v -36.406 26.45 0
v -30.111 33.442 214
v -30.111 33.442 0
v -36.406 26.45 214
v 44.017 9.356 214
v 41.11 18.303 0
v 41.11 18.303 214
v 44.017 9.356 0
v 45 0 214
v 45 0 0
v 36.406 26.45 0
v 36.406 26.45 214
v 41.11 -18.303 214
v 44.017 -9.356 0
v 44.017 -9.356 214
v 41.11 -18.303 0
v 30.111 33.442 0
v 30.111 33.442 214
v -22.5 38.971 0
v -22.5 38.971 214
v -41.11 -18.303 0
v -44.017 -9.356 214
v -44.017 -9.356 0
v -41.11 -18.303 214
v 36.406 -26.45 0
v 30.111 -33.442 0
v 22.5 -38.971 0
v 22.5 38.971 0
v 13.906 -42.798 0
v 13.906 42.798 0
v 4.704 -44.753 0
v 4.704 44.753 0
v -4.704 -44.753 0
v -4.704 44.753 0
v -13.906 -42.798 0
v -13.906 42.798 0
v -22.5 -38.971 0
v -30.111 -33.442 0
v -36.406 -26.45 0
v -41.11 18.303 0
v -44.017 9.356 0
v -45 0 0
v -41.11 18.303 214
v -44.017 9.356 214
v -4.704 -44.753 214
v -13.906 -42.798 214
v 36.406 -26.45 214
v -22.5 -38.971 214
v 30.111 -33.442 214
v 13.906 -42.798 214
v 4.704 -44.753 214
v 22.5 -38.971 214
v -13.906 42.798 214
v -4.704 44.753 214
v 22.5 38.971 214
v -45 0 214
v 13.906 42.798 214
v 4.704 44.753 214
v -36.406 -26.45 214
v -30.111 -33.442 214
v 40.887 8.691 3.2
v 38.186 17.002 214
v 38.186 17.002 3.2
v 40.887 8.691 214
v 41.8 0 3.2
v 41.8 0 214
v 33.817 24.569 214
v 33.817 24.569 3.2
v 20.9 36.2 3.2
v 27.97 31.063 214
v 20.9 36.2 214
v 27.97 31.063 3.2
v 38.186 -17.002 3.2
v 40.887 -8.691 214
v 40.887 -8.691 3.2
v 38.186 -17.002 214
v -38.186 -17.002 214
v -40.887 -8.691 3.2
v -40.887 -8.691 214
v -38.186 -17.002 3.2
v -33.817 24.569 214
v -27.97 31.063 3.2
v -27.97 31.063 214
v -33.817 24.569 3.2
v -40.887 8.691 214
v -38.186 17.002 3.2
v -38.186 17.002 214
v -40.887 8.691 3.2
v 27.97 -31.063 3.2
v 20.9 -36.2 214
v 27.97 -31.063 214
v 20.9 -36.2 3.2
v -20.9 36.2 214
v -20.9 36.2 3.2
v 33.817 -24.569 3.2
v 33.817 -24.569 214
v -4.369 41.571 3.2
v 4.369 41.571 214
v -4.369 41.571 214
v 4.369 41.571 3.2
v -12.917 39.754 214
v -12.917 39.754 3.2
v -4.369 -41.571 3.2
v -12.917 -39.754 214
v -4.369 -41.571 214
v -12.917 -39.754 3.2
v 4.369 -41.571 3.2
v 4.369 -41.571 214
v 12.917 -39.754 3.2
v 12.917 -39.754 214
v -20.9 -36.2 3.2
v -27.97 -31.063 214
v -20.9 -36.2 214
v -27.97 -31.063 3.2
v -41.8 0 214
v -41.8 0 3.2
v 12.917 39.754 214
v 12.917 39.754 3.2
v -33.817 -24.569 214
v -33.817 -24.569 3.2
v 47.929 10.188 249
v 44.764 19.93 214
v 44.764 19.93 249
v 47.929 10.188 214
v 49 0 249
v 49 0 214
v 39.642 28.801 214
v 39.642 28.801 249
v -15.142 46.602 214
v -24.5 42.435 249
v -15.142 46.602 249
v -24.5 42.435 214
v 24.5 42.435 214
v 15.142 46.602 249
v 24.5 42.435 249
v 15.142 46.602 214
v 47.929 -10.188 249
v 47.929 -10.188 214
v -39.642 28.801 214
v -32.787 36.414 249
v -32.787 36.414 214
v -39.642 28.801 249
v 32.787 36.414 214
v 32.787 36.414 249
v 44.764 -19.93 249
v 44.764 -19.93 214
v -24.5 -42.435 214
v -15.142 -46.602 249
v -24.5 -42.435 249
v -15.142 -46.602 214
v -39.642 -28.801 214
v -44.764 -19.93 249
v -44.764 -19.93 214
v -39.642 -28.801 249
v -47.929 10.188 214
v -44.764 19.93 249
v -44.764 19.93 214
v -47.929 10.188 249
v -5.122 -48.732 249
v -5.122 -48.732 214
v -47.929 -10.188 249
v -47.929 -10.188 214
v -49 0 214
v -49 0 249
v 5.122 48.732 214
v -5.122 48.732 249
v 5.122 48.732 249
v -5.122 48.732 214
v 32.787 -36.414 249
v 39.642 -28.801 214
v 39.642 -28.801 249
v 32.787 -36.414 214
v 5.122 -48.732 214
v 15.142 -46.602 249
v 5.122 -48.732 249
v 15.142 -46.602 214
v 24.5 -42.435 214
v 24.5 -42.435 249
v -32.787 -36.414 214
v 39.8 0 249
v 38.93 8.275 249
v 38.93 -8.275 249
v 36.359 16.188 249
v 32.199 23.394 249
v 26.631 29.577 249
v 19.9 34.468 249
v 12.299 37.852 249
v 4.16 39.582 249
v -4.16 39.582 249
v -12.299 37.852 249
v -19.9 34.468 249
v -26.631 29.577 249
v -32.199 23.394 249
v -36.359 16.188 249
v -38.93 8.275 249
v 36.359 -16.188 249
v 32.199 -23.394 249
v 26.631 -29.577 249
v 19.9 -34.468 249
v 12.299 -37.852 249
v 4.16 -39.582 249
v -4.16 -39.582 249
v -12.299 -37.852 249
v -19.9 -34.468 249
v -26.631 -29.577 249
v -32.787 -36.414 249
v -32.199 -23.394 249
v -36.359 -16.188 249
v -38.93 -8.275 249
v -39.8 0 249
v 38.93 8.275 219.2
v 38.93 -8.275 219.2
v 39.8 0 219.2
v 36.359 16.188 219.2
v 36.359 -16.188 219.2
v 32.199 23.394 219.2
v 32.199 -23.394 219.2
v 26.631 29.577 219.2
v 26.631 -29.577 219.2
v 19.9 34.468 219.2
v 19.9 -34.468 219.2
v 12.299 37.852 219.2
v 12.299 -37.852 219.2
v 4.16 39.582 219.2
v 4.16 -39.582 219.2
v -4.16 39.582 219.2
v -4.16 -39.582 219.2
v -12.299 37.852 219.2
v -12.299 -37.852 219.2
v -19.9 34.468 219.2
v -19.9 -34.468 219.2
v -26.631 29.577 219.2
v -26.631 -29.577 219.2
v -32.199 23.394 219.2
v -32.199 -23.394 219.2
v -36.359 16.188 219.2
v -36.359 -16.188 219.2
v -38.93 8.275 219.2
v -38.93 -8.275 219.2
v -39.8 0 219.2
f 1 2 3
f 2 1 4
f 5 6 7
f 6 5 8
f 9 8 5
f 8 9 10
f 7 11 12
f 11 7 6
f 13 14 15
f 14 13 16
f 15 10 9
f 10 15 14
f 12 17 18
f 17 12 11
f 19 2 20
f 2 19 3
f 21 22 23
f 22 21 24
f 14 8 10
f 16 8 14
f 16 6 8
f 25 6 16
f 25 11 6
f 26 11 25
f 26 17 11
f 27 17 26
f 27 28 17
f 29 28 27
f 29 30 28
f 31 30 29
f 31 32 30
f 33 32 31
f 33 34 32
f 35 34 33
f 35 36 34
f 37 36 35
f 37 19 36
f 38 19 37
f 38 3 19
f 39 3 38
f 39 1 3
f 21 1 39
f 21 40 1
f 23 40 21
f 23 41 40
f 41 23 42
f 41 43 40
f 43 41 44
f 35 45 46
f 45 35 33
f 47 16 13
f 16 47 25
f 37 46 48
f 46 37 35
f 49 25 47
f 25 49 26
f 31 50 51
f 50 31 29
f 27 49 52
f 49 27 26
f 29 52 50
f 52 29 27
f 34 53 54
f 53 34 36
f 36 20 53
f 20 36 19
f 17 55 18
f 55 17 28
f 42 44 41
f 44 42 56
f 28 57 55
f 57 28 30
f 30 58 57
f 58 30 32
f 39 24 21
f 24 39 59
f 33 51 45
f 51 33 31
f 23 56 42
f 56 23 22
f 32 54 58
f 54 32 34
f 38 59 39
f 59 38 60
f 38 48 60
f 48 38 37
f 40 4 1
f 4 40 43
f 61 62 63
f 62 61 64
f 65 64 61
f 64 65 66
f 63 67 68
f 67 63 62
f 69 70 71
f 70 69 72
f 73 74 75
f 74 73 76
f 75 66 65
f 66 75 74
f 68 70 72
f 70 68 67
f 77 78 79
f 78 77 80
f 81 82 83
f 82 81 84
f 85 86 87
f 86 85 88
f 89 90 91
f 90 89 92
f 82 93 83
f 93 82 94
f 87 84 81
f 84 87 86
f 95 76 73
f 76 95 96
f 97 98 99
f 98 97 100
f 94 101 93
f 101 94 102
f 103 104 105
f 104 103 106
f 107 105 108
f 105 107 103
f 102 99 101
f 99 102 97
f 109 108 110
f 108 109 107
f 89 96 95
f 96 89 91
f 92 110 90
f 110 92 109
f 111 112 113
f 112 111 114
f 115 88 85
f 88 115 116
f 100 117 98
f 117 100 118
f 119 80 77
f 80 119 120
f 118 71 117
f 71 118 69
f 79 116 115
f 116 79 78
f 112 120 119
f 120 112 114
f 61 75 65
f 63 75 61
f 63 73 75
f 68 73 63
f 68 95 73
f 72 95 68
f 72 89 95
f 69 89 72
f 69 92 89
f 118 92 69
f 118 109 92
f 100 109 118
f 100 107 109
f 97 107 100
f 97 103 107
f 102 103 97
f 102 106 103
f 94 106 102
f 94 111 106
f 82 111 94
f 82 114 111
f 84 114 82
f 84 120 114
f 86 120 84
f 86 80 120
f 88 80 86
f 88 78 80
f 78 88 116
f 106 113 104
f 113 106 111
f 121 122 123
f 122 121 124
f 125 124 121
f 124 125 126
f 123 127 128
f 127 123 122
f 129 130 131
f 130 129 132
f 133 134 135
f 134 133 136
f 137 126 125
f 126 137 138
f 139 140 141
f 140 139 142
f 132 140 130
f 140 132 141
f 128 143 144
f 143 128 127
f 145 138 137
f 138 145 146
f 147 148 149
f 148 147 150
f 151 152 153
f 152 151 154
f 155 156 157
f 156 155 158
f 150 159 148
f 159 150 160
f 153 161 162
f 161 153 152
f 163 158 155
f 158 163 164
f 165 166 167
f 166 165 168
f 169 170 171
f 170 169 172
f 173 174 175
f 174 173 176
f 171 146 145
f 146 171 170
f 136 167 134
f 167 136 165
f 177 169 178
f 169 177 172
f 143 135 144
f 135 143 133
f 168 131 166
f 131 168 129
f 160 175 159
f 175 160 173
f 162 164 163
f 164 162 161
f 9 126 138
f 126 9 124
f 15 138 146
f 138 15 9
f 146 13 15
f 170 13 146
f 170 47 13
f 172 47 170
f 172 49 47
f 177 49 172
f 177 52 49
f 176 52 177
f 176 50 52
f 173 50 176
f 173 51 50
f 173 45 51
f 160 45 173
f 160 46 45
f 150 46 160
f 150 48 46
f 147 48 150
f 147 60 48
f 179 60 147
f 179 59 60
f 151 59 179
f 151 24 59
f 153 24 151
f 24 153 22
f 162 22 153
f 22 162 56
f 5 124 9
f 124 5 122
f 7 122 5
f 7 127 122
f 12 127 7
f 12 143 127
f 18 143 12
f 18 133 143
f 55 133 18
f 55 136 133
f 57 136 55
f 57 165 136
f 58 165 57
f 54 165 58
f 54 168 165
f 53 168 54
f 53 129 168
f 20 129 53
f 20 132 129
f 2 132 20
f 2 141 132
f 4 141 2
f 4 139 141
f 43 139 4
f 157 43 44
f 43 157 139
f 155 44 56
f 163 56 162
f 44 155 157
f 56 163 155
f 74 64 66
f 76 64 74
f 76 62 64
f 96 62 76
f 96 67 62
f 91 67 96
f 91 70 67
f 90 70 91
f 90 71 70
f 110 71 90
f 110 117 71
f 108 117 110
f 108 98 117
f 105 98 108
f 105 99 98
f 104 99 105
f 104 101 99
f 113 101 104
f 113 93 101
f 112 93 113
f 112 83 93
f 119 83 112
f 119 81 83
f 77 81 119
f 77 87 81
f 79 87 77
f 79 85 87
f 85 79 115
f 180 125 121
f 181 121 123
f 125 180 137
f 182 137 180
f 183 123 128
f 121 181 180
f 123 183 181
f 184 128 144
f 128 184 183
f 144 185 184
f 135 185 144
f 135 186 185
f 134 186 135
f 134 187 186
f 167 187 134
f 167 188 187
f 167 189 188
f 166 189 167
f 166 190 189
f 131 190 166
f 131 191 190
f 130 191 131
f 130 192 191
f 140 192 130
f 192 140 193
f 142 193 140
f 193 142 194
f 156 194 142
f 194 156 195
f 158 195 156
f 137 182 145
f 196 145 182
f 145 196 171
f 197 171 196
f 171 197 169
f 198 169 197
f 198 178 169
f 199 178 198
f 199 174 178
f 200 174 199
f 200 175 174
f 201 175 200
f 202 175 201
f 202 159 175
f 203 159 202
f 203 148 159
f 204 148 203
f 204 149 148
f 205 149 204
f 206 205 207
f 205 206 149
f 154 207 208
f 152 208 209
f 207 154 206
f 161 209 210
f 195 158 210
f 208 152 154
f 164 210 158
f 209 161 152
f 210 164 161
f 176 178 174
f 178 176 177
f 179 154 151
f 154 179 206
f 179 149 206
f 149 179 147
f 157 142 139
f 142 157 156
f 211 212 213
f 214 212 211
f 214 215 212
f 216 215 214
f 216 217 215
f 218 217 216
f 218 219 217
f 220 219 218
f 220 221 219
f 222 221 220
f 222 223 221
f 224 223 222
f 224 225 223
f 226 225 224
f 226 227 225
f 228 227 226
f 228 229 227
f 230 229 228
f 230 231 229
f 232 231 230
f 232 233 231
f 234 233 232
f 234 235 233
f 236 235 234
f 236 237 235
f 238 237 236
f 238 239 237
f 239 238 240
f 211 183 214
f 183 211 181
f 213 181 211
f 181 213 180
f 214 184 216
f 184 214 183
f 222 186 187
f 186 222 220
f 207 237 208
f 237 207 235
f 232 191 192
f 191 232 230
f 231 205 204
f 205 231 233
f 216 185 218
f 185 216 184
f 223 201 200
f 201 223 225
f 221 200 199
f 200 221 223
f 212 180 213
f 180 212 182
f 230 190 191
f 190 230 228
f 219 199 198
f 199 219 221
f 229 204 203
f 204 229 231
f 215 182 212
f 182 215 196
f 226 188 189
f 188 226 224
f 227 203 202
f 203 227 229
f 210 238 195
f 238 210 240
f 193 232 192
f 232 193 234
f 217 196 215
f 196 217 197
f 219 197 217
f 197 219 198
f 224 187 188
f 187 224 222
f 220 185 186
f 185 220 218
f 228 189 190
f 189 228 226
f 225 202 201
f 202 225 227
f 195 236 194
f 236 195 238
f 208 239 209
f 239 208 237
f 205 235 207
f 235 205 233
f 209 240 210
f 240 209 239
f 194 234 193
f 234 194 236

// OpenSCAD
// Parameters
pipe_standard = 1; //[1:1:1]
nominal_diameter = 90; //[50:180:1]
length_mm = 250; //[125:500:1]
end_fitting = 1; //[0:1:1]
pipe_wall = 3.2; //[1.6:6.4:0.1]
fitting_length = 35; //[15:70:1]
fitting_wall_extra = 2.0; //[0.5:5.0:0.1]
fitting_od_extra = 8; //[2:20:1]
overlap = 1.0; //[0.5:2.0:0.1]

// HT Pipe - complete geometry
module ht_pipe() {
  color([0.85, 0.85, 0.8]) { // PVC color
    // Pipe Body
    difference() {
      cylinder(r=nominal_diameter/2, h=length_mm - (end_fitting * fitting_length), center=false);
      translate([0, 0, pipe_wall])
        cylinder(r=nominal_diameter/2 - pipe_wall, h=length_mm - (end_fitting * fitting_length) + overlap, center=false);
    }
    
    // Integrated End Fitting
    if (end_fitting == 1) {
      difference() {
        translate([0, 0, length_mm - (end_fitting * fitting_length) - overlap])
          cylinder(r=(nominal_diameter + fitting_od_extra)/2, h=end_fitting * fitting_length, center=false);
        translate([0, 0, length_mm - (end_fitting * fitting_length) - overlap + (pipe_wall + fitting_wall_extra)])
          cylinder(r=nominal_diameter/2 - (pipe_wall + fitting_wall_extra), h=end_fitting * fitting_length + overlap, center=false);
      }
    }
  }
}

// Assembly
module assembly() {
  ht_pipe();
}

assembly();
